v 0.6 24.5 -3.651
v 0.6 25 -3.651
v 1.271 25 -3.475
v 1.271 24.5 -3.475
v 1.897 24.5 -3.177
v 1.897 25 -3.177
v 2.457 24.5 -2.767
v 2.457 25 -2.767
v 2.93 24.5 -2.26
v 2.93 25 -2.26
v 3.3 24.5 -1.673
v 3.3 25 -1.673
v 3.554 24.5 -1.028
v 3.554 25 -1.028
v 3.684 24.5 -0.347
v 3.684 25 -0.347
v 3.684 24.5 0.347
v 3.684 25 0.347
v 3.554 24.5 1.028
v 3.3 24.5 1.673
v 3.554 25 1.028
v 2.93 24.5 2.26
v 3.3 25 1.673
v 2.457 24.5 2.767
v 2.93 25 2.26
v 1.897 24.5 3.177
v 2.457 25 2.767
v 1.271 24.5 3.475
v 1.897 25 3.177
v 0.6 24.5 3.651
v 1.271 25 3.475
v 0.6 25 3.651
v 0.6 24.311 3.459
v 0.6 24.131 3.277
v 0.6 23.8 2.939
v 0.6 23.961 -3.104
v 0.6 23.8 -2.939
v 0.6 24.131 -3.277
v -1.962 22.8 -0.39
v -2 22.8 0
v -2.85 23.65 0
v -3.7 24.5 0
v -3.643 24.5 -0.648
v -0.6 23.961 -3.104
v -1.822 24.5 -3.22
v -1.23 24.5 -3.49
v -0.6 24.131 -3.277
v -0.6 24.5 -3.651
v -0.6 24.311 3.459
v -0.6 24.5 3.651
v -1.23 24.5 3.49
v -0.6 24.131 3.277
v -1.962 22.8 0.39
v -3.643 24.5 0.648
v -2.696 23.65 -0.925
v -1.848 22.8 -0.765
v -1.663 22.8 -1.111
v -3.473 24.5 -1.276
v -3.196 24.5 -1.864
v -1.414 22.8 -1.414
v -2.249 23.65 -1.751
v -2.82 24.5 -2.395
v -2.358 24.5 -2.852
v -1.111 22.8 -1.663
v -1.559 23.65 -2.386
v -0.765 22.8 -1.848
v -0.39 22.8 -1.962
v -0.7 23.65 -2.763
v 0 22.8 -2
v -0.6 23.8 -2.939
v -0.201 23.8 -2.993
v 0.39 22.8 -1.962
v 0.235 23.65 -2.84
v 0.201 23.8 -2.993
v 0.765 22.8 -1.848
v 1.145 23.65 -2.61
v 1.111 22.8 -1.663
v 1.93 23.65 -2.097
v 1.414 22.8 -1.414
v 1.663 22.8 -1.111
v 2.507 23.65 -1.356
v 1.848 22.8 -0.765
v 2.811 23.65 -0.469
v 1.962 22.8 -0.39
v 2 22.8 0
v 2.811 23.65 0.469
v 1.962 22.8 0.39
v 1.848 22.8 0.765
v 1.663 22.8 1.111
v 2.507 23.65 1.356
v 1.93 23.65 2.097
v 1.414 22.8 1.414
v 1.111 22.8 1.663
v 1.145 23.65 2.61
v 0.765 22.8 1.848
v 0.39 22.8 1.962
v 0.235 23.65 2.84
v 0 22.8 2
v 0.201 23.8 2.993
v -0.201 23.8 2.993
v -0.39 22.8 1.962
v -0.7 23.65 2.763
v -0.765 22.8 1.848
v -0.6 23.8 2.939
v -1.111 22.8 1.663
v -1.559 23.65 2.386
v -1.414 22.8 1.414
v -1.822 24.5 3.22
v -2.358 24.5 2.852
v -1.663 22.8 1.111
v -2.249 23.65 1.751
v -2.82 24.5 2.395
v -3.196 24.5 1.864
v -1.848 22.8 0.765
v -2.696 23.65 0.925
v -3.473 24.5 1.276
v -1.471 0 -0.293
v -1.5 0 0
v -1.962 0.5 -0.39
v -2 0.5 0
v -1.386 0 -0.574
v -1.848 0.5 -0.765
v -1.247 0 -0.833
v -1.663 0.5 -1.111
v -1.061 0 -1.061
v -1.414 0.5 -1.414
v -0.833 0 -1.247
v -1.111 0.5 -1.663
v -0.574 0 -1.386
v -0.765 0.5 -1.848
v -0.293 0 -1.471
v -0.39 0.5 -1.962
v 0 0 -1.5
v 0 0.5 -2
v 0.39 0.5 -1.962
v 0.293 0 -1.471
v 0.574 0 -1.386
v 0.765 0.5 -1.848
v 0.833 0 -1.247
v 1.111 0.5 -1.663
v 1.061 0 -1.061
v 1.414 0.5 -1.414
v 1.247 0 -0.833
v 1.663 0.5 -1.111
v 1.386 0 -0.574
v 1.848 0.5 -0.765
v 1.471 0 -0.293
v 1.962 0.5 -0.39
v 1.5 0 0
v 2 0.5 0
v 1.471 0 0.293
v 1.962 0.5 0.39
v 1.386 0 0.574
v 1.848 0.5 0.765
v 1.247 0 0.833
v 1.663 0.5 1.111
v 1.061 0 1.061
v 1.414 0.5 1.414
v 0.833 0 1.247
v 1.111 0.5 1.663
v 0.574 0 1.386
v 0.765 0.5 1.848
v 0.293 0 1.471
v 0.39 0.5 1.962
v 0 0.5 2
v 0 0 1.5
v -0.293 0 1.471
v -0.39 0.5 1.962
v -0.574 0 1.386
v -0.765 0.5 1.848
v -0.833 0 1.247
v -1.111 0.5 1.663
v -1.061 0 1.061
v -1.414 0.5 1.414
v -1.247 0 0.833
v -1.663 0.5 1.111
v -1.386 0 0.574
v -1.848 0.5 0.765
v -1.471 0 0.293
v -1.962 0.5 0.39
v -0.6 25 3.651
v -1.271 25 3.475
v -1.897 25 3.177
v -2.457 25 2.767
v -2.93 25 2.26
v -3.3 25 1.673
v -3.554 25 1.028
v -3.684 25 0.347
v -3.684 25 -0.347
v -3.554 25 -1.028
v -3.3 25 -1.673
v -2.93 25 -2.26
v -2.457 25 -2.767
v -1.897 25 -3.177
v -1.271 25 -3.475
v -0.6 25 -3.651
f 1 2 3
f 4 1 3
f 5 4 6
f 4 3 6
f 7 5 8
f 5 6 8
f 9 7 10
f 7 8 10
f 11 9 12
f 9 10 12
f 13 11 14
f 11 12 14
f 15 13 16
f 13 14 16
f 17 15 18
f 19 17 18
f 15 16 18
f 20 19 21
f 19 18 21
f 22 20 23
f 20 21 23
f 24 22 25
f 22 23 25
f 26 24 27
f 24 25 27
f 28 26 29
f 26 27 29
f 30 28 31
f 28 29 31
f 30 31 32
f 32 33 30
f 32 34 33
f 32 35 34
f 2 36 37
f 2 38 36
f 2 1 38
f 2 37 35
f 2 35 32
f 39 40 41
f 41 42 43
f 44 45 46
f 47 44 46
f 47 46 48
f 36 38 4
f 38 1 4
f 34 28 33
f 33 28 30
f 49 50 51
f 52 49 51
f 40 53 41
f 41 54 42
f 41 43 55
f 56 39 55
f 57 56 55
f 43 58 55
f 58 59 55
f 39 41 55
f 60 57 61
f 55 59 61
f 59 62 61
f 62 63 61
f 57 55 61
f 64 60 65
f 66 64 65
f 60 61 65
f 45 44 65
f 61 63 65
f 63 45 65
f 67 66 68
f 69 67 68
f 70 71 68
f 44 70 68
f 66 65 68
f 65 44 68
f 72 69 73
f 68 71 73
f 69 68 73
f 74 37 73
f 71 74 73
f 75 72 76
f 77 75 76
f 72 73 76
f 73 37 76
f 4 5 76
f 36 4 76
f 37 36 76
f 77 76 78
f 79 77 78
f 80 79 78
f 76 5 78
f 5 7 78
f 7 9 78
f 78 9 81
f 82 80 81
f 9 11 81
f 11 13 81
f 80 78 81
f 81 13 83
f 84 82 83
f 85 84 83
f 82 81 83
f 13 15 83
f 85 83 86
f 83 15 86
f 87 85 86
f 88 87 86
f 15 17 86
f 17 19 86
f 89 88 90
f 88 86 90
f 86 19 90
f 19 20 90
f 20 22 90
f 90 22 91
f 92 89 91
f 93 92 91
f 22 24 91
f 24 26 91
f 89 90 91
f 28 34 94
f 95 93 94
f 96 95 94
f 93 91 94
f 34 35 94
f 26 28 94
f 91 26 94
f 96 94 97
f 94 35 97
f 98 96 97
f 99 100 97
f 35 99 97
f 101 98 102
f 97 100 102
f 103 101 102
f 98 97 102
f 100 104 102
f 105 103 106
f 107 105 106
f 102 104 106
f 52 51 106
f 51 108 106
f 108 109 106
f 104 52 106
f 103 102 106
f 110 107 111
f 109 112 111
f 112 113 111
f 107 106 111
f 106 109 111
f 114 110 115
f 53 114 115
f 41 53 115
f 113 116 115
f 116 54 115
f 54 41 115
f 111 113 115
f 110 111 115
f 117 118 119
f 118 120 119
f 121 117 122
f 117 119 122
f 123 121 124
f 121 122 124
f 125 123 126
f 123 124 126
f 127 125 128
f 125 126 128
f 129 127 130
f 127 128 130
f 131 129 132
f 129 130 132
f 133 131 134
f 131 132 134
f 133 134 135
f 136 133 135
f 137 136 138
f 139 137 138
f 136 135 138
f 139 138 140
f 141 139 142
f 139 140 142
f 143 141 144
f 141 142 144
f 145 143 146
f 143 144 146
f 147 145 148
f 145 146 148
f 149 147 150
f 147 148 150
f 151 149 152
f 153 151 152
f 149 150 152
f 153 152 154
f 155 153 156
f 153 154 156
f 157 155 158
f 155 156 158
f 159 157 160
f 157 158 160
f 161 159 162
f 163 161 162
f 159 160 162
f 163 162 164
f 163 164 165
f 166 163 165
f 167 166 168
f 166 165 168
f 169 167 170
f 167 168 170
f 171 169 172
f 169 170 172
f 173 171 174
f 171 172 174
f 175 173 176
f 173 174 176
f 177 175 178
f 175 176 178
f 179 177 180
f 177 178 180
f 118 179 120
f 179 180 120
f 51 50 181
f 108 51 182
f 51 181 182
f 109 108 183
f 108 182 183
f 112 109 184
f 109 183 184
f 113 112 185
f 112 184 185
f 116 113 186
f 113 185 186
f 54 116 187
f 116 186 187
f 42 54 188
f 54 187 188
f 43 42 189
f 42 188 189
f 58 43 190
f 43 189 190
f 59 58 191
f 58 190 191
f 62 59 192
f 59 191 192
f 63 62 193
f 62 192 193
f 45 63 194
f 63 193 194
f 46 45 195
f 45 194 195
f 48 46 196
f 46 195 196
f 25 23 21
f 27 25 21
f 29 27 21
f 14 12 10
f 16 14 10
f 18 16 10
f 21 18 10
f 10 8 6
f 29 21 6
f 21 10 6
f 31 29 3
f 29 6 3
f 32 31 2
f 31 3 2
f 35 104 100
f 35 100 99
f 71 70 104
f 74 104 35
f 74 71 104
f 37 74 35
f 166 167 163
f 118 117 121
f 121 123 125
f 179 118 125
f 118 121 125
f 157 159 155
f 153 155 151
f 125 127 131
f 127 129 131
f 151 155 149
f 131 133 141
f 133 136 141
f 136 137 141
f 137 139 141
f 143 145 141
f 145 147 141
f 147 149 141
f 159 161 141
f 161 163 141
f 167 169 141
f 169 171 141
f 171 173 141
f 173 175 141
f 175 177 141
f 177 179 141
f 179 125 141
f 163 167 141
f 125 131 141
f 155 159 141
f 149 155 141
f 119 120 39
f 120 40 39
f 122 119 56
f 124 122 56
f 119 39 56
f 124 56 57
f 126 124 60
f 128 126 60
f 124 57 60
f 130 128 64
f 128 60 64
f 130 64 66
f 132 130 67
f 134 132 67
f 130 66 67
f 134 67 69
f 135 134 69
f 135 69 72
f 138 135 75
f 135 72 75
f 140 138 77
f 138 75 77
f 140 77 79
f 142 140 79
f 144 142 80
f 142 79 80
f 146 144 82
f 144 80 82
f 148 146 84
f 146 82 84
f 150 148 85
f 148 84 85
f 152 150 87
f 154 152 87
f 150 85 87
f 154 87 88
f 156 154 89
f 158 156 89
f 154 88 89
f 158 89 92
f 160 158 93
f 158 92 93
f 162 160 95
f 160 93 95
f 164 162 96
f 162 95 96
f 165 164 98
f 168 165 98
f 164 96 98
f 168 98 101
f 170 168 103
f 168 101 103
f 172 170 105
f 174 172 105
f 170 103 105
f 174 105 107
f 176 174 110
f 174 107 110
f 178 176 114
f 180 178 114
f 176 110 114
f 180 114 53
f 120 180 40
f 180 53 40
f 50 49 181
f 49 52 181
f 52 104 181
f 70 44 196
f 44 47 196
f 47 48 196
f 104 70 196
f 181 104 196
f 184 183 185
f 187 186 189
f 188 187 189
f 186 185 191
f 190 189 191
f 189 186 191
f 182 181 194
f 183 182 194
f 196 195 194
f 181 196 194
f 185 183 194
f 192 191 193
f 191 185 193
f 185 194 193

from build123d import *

# Parameters (mm, degrees)
CUT_EXTRUDE_1_DEPTH      = 26.54173056
CUT_EXTRUDE_1_DEPTH_BACK = 26.54173056
SKETCH_2_W               = 1.2
SKETCH_2_H               = 1.2


with BuildPart() as part:
    # Эскиз1 → Повернуть1 (revolve)
    with BuildSketch(Plane.XY):
        Polygon((0, 0), (-1.5, 0), (-2, 0.5), (-2, 22.8), (-3.7, 24.5), (-3.7, 25), (0, 25), align=None)
    revolve(axis=Axis((0, 25, 0), (0, -1, 0)))

    # Эскиз2 → Вырез-Вытянуть1 (cut, two sides: drawn at the far end of the back side and taken through both)
    with BuildSketch(Plane.XY.offset(-CUT_EXTRUDE_1_DEPTH_BACK)):
        with Locations((0, 24.4)):
            Rectangle(SKETCH_2_W, SKETCH_2_H)
    extrude(amount=CUT_EXTRUDE_1_DEPTH + CUT_EXTRUDE_1_DEPTH_BACK, mode=Mode.SUBTRACT)


solid = part.part
